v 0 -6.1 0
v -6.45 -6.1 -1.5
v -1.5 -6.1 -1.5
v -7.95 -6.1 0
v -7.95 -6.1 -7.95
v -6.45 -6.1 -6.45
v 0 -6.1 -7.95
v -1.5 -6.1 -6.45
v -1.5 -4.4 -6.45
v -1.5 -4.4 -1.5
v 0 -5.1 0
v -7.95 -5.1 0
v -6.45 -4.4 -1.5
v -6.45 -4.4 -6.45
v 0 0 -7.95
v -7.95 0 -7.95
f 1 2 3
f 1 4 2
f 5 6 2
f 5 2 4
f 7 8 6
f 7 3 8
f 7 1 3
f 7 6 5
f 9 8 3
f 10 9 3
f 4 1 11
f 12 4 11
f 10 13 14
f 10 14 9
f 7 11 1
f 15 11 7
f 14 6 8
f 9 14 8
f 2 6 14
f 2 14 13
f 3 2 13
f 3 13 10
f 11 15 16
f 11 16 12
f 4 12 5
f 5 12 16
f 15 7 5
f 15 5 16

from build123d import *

# Parameters (mm, degrees)
SKETCH1_W           = 7.95
SKETCH1_H           = 6.1
BOSS_EXTRUDE1_DEPTH = 7.95
CUT_EXTRUDE1_DEPTH  = 17.7
SKETCH3_W           = 4.95
SKETCH3_H           = 4.95
CUT_EXTRUDE2_DEPTH  = 1.7


with BuildPart() as part:
    # Sketch1 → Boss-Extrude1 (new body)
    with BuildSketch(Plane(origin=(0, 0, 0), x_dir=(0, 0, -1), z_dir=(1, 0, 0))):
        with Locations((3.975, -3.05)):
            Rectangle(SKETCH1_W, SKETCH1_H)
    extrude(amount=-BOSS_EXTRUDE1_DEPTH)

    # Sketch2 → Cut-Extrude1 (cut)
    with BuildSketch(Plane(origin=(0, 0, 0), x_dir=(0, 0, -1), z_dir=(1, 0, 0))):
        Polygon((7.95, 0), (0, -5.1), (0, 0), align=None)
    extrude(amount=-CUT_EXTRUDE1_DEPTH, mode=Mode.SUBTRACT)

    # Sketch3 → Cut-Extrude2 (cut)
    with BuildSketch(Plane.XZ.offset(6.1)):
        with Locations((-3.975, -3.975)):
            Rectangle(SKETCH3_W, SKETCH3_H)
    extrude(amount=-CUT_EXTRUDE2_DEPTH, mode=Mode.SUBTRACT)


solid = part.part
